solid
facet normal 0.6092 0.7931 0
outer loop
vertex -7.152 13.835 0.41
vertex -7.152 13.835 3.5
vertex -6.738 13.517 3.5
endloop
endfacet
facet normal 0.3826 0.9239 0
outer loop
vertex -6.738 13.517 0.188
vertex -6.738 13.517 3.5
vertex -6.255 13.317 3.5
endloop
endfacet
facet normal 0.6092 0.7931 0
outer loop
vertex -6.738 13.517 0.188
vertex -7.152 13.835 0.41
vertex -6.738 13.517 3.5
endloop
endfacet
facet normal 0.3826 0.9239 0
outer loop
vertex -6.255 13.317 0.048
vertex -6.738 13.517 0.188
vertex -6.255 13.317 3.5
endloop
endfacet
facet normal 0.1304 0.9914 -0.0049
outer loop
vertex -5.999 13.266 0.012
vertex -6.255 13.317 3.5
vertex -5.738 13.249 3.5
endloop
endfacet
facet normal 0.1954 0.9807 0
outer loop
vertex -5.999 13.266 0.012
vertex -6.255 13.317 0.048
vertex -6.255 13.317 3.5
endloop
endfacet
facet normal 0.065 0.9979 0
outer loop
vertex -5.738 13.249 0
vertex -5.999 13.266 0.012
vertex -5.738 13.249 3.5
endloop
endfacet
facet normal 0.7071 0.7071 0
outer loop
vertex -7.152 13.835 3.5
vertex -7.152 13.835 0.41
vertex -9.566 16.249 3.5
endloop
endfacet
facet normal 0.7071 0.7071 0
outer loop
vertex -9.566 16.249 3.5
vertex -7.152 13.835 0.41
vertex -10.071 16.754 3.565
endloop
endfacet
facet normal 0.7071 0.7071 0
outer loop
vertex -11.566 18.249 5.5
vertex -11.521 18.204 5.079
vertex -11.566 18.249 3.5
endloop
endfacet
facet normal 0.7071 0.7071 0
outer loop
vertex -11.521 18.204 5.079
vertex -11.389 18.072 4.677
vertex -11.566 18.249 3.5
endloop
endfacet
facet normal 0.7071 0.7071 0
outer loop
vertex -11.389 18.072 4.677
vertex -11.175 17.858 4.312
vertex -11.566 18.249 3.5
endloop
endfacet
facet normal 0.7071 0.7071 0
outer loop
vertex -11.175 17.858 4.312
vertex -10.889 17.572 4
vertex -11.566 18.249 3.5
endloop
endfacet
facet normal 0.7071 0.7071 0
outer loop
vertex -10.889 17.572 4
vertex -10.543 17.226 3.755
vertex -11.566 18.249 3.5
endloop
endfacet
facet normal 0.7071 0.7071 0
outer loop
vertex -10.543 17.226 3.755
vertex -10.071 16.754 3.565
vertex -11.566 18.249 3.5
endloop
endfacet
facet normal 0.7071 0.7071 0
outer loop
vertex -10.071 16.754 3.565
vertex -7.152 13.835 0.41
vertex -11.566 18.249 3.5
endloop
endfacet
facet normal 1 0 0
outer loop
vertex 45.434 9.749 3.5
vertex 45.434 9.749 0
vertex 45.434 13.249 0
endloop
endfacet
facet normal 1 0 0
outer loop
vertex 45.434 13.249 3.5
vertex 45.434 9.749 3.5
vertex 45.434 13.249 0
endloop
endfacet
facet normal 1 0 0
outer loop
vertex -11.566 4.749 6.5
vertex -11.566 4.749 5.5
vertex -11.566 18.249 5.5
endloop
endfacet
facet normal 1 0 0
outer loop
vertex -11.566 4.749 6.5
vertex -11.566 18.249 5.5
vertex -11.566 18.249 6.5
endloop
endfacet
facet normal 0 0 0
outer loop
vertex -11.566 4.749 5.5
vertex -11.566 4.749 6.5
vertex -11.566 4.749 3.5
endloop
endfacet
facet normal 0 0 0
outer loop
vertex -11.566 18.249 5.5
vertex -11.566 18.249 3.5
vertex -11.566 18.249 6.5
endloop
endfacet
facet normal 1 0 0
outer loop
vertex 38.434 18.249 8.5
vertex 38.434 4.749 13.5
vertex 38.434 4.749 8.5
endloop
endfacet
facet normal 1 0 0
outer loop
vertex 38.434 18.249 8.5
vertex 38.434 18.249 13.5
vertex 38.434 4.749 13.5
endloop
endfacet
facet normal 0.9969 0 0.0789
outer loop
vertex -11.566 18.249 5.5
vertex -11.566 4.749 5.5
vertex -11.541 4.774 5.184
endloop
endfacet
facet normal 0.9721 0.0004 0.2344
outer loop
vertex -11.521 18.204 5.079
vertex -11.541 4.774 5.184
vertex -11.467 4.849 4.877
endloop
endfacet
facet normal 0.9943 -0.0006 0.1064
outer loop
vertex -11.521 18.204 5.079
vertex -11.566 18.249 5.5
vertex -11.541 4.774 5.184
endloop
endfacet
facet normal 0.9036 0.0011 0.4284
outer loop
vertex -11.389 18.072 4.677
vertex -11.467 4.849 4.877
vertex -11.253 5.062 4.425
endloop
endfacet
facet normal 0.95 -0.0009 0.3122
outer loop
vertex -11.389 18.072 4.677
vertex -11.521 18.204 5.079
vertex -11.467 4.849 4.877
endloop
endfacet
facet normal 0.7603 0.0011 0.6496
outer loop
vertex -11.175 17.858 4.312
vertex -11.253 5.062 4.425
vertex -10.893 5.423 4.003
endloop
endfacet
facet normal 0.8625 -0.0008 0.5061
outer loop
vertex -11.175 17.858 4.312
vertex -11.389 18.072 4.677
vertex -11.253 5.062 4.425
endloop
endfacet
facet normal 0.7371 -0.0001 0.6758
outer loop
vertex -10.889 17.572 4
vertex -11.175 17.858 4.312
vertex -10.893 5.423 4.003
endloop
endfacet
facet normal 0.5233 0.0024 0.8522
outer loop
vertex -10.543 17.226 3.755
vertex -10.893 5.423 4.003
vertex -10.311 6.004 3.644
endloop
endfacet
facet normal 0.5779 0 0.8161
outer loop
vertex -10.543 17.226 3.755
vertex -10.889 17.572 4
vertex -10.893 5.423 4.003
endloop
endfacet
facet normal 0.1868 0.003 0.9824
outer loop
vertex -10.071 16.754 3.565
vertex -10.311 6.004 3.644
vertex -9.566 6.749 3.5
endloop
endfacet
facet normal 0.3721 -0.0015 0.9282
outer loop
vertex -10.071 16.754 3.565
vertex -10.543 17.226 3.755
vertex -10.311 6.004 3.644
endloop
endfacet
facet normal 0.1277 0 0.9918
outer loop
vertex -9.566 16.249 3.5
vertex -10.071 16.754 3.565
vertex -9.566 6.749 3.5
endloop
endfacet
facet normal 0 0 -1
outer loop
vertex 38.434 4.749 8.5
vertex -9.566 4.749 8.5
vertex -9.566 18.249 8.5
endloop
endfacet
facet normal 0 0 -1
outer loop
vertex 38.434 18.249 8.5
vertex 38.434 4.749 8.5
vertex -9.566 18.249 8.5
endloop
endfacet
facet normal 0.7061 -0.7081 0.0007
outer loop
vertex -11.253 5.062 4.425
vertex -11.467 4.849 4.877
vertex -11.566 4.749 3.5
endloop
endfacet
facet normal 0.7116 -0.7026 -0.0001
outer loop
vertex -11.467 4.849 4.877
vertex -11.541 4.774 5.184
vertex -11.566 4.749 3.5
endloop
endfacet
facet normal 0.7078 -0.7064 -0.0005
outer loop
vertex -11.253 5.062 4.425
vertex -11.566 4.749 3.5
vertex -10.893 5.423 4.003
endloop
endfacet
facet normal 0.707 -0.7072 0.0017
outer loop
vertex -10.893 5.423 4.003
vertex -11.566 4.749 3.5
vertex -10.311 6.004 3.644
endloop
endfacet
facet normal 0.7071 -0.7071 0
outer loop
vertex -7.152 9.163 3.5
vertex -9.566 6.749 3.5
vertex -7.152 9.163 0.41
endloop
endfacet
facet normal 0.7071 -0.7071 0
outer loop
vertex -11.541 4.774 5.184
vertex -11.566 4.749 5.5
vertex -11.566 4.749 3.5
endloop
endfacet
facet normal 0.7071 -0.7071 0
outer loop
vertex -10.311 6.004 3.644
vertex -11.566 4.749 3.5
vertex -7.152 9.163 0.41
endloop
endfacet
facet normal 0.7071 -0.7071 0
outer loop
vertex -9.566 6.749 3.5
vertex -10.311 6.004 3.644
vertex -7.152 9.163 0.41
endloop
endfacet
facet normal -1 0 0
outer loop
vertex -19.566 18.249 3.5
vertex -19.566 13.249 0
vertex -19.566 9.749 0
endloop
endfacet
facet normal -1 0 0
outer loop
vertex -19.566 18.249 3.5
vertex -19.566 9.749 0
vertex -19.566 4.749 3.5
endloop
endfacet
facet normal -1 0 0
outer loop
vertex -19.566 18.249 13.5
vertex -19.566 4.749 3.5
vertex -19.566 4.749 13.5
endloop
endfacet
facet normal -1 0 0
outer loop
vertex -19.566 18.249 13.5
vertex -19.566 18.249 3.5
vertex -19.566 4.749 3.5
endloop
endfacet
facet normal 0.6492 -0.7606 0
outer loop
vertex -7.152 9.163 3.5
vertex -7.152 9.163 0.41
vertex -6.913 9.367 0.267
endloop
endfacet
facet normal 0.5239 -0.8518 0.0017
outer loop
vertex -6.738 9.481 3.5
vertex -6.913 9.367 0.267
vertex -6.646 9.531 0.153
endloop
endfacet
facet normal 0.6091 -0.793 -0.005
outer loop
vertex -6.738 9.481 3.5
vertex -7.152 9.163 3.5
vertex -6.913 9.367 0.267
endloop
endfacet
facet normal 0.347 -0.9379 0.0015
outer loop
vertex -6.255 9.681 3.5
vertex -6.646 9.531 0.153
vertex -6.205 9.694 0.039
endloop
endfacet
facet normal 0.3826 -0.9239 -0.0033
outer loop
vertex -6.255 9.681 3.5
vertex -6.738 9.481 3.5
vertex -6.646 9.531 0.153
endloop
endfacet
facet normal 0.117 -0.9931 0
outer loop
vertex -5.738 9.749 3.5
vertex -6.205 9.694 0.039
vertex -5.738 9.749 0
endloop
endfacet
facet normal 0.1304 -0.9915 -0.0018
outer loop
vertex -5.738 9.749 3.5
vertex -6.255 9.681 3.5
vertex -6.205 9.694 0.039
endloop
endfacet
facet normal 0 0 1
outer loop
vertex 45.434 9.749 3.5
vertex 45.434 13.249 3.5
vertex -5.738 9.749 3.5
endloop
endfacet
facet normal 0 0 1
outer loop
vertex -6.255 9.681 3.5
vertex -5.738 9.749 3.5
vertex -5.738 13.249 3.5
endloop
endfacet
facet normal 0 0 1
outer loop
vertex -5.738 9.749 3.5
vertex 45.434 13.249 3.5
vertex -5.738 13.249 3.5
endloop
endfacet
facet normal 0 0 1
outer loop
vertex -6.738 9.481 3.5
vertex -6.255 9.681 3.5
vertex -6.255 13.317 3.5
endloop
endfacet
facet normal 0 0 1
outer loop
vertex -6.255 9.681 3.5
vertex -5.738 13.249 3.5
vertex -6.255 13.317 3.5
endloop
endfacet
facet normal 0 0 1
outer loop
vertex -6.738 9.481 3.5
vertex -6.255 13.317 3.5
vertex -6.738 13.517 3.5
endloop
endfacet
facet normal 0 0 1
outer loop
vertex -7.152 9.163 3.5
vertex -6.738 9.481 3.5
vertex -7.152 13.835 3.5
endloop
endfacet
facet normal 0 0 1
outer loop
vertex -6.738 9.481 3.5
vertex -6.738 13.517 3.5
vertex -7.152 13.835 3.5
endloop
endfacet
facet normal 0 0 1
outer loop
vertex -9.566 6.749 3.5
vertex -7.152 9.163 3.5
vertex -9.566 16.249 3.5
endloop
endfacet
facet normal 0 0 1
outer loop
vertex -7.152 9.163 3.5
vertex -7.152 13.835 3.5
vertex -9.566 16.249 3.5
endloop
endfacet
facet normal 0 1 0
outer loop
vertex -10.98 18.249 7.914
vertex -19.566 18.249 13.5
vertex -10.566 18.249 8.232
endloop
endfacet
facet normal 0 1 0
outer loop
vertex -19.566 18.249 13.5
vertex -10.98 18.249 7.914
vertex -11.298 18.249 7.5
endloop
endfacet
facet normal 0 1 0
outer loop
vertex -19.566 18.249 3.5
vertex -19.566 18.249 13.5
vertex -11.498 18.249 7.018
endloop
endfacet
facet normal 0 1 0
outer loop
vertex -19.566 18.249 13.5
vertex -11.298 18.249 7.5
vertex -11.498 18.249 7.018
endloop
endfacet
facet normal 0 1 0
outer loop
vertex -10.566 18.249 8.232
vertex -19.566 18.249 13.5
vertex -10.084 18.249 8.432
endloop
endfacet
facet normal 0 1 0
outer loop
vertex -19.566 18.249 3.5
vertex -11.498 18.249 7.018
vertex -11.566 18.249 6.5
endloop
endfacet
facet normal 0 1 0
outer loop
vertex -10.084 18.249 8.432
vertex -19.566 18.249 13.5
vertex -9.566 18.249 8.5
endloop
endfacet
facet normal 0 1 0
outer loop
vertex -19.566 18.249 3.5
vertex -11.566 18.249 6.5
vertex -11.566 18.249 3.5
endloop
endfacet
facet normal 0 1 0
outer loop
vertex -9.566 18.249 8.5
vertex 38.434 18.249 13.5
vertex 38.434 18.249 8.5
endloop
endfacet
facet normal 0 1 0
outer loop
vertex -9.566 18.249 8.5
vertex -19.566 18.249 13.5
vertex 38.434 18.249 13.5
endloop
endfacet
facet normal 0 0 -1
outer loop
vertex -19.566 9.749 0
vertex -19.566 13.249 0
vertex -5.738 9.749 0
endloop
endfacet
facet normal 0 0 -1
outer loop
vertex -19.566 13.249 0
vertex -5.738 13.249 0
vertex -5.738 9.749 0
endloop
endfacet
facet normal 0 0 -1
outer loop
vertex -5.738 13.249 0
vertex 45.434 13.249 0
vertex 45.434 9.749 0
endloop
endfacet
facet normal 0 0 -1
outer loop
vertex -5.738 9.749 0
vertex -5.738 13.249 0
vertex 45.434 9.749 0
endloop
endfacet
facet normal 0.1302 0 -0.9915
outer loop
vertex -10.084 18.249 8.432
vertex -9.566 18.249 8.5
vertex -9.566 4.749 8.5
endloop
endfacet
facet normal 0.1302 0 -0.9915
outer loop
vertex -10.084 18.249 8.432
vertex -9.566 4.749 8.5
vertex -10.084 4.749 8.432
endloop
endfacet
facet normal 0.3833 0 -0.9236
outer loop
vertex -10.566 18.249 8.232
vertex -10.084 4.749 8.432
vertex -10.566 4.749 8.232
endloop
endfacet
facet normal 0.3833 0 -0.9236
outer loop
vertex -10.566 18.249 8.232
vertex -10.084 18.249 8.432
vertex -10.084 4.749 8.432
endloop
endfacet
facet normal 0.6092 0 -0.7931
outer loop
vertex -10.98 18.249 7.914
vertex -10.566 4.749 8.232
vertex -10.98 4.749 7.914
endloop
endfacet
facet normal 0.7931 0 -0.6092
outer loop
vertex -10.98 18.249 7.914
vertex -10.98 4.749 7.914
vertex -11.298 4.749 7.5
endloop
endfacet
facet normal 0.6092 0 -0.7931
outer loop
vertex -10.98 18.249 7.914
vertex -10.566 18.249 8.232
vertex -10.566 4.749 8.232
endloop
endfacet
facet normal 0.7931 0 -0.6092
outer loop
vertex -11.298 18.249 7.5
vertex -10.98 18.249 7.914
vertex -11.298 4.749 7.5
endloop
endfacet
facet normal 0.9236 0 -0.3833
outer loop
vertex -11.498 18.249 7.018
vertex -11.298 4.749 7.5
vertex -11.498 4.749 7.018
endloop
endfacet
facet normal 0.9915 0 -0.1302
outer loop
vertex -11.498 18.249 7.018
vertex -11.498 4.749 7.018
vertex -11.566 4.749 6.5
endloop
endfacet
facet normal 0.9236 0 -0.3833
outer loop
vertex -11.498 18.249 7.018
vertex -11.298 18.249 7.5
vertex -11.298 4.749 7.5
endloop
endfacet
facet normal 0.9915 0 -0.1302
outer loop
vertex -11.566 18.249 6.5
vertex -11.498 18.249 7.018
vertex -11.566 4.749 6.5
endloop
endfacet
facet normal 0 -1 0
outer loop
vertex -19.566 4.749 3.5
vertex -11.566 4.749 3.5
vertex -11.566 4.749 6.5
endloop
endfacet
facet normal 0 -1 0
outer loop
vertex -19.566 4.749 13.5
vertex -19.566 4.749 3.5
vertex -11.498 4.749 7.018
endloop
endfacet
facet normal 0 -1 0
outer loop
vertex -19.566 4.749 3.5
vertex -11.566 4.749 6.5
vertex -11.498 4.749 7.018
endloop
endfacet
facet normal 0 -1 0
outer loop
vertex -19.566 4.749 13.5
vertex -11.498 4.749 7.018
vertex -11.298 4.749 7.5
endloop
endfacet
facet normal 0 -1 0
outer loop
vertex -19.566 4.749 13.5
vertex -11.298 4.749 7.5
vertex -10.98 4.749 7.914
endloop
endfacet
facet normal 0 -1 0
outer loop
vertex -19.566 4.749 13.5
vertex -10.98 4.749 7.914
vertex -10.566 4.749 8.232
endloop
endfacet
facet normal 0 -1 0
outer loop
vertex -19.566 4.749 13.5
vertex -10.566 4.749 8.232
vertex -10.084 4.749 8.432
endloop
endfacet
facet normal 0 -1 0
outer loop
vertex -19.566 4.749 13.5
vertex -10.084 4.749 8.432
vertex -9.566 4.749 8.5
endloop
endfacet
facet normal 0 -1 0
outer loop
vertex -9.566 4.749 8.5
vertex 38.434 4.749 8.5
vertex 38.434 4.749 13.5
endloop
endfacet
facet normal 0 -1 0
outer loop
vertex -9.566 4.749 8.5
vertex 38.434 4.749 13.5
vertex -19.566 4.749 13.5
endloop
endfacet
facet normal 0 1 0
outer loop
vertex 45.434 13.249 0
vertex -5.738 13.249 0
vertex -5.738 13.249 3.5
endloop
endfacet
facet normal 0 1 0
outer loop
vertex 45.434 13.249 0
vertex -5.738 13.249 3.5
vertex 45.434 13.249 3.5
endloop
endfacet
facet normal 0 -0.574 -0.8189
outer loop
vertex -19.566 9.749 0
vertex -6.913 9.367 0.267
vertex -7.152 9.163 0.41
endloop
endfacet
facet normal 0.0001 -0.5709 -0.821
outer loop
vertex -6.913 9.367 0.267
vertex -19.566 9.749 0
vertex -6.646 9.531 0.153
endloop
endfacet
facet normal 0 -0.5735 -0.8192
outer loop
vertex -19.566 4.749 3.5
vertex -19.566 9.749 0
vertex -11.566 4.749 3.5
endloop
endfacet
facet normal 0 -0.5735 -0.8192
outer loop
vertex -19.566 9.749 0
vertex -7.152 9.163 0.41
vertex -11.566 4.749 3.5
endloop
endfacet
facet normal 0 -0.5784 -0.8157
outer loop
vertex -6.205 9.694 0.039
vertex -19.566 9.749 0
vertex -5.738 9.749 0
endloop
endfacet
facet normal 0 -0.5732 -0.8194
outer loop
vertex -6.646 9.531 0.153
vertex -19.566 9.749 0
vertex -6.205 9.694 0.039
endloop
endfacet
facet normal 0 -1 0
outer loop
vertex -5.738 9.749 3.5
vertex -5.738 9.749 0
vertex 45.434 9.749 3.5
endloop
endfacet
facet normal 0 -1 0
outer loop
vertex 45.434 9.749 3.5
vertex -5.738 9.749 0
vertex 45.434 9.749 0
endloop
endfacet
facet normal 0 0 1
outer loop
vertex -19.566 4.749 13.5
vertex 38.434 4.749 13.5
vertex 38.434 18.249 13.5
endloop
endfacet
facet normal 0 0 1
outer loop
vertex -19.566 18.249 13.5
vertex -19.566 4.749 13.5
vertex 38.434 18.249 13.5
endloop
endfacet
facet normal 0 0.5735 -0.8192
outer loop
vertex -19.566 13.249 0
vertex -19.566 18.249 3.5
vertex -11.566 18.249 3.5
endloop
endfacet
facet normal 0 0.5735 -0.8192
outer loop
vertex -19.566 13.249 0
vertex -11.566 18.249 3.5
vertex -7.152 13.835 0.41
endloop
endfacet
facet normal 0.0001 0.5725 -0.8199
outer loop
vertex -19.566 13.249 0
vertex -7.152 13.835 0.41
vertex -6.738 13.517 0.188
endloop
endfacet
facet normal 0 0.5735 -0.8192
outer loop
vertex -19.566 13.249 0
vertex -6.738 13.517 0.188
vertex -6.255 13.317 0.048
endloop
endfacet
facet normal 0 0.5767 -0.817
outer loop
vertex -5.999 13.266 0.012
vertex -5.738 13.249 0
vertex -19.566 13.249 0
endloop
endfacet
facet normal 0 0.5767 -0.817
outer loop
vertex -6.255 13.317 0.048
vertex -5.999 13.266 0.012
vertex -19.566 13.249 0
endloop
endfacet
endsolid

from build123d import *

# Parameters (mm, degrees)
SKETCH_1_W      = 60
SKETCH_1_H      = 3.5
EXTRUDE_1_DEPTH = 3.5
SKETCH_2_W      = 3
SKETCH_2_H      = 5
SKETCH_2_H_2    = 3.5
EXTRUDE_2_DEPTH = 10
EXTRUDE_3_DEPTH = 3
SKETCH_4_W      = 5
SKETCH_4_H      = 5.5
SKETCH_4_H_2    = 4
EXTRUDE_4_DEPTH = 50
CHAMFER_1_SIZE  = 5
FILLET_1_R      = 2
EXTRUDE_5_DEPTH = 5


# Some blends are built 0.0001 mm under size
with BuildPart() as part:
    # 草图1 → 凸台-拉伸1 (new body)
    with BuildSketch(Plane.XY):
        with Locations((15.433843148, 11.499032355)):
            Rectangle(SKETCH_1_W, SKETCH_1_H)
    extrude(amount=EXTRUDE_1_DEPTH)

    # 草图2 → 凸台-拉伸2 (add)
    with BuildSketch(Plane.XY.offset(3.5)):
        with Locations((-13.066156852, 15.749032355)):
            Rectangle(SKETCH_2_W, SKETCH_2_H)
        with Locations((-13.066156852, 11.499032355)):
            Rectangle(SKETCH_2_W, SKETCH_2_H_2)
        with Locations((-13.066156852, 7.249032355)):
            Rectangle(SKETCH_2_W, SKETCH_2_H)
    extrude(amount=EXTRUDE_2_DEPTH)

    # 草图3 → 凸台-拉伸3 (add)
    with BuildSketch(Plane.ZY.offset(14.566156852)):
        Polygon((0, 9.749032355), (3.5, 4.749032355), (3.5, 9.749032355), align=None)
        Polygon((3.5, 18.249032355), (0, 13.249032355), (3.5, 13.249032355), align=None)
    extrude(amount=-EXTRUDE_3_DEPTH)

    # 草图4 → 凸台-拉伸4 (add)
    with BuildSketch(Plane(origin=(-11.566156852, 0, 0), x_dir=(0, 0, -1), z_dir=(1, 0, 0))):
        with Locations((-11, 11.499032355)):
            Rectangle(SKETCH_4_W, SKETCH_4_H)
        with Locations((-11, 6.749032355)):
            Rectangle(SKETCH_4_W, SKETCH_4_H_2)
        with Locations((-11, 16.249032355)):
            Rectangle(SKETCH_4_W, SKETCH_4_H_2)
    extrude(amount=EXTRUDE_4_DEPTH)

    # 倒角1
    chamfer_1_edges = [part.edges().sort_by_distance(p)[0] for p in [
        (-11.566156852, 9.749032355, 1.75),
        (-11.566156852, 13.249032355, 1.75),
    ]]
    chamfer(chamfer_1_edges, length=CHAMFER_1_SIZE - 0.0001)  # a hair under: the kernel refuses the full size

    # 圆角1
    # the kernel refuses this fillet: 2 mm, written as the material it adds along each edge
    with BuildSketch(Plane(origin=(-11.566156852, 23.248932355, 3.5), x_dir=(1, 0, 0), z_dir=(0, -1, 0))) as fillet_1_piece_1_section:
        with BuildLine():
            CenterArc((FILLET_1_R, FILLET_1_R), FILLET_1_R, 180, 90)
            Line((0, FILLET_1_R), (0, 0))
            Line((0, 0), (FILLET_1_R, 0))
        make_face()
    fillet_1_piece_1 = extrude(amount=23.4998, mode=Mode.PRIVATE)
    fillet_1_piece_1 = split(fillet_1_piece_1, bisect_by=Plane(origin=(-7.979513836, 8.335775371, 3.970107375), z_dir=(-0.7071067811865476, 0.7071067811865476, 0)), keep=Keep.TOP, mode=Mode.PRIVATE)
    fillet_1_piece_1 = split(fillet_1_piece_1, bisect_by=Plane(origin=(-7.979513836, 14.662289339, 3.970107375), z_dir=(-0.7071067811865475, -0.7071067811865477, 0)), keep=Keep.TOP, mode=Mode.PRIVATE)
    fillet_1_piece_1 = split(fillet_1_piece_1, bisect_by=Plane(origin=(-11.14277082, 4.749032355, 3.970107375), z_dir=(0, 1, 0)), keep=Keep.TOP, mode=Mode.PRIVATE)
    fillet_1_piece_1 = split(fillet_1_piece_1, bisect_by=Plane(origin=(-11.14277082, 18.249032355, 3.970107375), z_dir=(0, -1, 0)), keep=Keep.TOP, mode=Mode.PRIVATE)
    fillet_1_piece_1 = split(fillet_1_piece_1, bisect_by=Plane(origin=(-11.14277082, 13.939686827, 0.48345813), z_dir=(0, -0.5734623443633282, 0.8192319205190406)), keep=Keep.TOP, mode=Mode.PRIVATE)
    add(fillet_1_piece_1)
    with BuildSketch(Plane(origin=(-11.566156852, 18.249032355, 8.5), x_dir=(0, 0, -1), z_dir=(0, -1, 0))) as fillet_1_piece_2:
        with BuildLine():
            CenterArc((FILLET_1_R, FILLET_1_R), FILLET_1_R, 180, 90)
            Line((0, FILLET_1_R), (0, 0))
            Line((0, 0), (FILLET_1_R, 0))
        make_face()
    extrude(amount=13.5)
    with BuildSketch(Plane(origin=(-6.566256852, 9.749032355, 3.5), x_dir=(-0.7071067811865475, -0.7071067811865475, 0), z_dir=(0, 0, -1))) as fillet_1_piece_3_section:
        with BuildLine():
            CenterArc((FILLET_1_R * 0.414213562373, -FILLET_1_R), FILLET_1_R, 90, 45)
            Line((-FILLET_1_R * 0.292893218813, -FILLET_1_R * 0.292893218813), (0, 0))
            Line((0, 0), (FILLET_1_R * 0.414213562373, 0))
        make_face()
    fillet_1_piece_3 = extrude(amount=3.5, mode=Mode.PRIVATE)
    fillet_1_piece_3 = split(fillet_1_piece_3, bisect_by=Plane(origin=(-6.5069765, 8.826534018, 0.645748836), z_dir=(0, 0.5734623443633283, 0.8192319205190405)), keep=Keep.TOP, mode=Mode.PRIVATE)
    add(fillet_1_piece_3)
    with BuildSketch(Plane(origin=(-6.566256852, 13.249032355, 0), x_dir=(1, 0, 0), z_dir=(0, 0, 1))) as fillet_1_piece_4_section:
        with BuildLine():
            CenterArc((FILLET_1_R * 0.414213562373, FILLET_1_R), FILLET_1_R, 225, 45)
            Line((-FILLET_1_R * 0.292893218813, FILLET_1_R * 0.292893218813), (0, 0))
            Line((0, 0), (FILLET_1_R * 0.414213562373, 0))
        make_face()
    fillet_1_piece_4 = extrude(amount=3.5, mode=Mode.PRIVATE)
    fillet_1_piece_4 = split(fillet_1_piece_4, bisect_by=Plane(origin=(-6.5069765, 14.171530692, 0.645748836), z_dir=(0, -0.5734623443633282, 0.8192319205190406)), keep=Keep.TOP, mode=Mode.PRIVATE)
    add(fillet_1_piece_4)

    # 草图5 → 凸台-拉伸5 (add)
    with BuildSketch(Plane.ZY.offset(14.566156852)):
        Polygon((3.5, 18.249032355), (0, 13.249032355), (0, 9.749032355), (3.5, 4.749032355), (13.5, 4.749032355), (13.5, 18.249032355), align=None)
    extrude(amount=EXTRUDE_5_DEPTH)


solid = part.part
